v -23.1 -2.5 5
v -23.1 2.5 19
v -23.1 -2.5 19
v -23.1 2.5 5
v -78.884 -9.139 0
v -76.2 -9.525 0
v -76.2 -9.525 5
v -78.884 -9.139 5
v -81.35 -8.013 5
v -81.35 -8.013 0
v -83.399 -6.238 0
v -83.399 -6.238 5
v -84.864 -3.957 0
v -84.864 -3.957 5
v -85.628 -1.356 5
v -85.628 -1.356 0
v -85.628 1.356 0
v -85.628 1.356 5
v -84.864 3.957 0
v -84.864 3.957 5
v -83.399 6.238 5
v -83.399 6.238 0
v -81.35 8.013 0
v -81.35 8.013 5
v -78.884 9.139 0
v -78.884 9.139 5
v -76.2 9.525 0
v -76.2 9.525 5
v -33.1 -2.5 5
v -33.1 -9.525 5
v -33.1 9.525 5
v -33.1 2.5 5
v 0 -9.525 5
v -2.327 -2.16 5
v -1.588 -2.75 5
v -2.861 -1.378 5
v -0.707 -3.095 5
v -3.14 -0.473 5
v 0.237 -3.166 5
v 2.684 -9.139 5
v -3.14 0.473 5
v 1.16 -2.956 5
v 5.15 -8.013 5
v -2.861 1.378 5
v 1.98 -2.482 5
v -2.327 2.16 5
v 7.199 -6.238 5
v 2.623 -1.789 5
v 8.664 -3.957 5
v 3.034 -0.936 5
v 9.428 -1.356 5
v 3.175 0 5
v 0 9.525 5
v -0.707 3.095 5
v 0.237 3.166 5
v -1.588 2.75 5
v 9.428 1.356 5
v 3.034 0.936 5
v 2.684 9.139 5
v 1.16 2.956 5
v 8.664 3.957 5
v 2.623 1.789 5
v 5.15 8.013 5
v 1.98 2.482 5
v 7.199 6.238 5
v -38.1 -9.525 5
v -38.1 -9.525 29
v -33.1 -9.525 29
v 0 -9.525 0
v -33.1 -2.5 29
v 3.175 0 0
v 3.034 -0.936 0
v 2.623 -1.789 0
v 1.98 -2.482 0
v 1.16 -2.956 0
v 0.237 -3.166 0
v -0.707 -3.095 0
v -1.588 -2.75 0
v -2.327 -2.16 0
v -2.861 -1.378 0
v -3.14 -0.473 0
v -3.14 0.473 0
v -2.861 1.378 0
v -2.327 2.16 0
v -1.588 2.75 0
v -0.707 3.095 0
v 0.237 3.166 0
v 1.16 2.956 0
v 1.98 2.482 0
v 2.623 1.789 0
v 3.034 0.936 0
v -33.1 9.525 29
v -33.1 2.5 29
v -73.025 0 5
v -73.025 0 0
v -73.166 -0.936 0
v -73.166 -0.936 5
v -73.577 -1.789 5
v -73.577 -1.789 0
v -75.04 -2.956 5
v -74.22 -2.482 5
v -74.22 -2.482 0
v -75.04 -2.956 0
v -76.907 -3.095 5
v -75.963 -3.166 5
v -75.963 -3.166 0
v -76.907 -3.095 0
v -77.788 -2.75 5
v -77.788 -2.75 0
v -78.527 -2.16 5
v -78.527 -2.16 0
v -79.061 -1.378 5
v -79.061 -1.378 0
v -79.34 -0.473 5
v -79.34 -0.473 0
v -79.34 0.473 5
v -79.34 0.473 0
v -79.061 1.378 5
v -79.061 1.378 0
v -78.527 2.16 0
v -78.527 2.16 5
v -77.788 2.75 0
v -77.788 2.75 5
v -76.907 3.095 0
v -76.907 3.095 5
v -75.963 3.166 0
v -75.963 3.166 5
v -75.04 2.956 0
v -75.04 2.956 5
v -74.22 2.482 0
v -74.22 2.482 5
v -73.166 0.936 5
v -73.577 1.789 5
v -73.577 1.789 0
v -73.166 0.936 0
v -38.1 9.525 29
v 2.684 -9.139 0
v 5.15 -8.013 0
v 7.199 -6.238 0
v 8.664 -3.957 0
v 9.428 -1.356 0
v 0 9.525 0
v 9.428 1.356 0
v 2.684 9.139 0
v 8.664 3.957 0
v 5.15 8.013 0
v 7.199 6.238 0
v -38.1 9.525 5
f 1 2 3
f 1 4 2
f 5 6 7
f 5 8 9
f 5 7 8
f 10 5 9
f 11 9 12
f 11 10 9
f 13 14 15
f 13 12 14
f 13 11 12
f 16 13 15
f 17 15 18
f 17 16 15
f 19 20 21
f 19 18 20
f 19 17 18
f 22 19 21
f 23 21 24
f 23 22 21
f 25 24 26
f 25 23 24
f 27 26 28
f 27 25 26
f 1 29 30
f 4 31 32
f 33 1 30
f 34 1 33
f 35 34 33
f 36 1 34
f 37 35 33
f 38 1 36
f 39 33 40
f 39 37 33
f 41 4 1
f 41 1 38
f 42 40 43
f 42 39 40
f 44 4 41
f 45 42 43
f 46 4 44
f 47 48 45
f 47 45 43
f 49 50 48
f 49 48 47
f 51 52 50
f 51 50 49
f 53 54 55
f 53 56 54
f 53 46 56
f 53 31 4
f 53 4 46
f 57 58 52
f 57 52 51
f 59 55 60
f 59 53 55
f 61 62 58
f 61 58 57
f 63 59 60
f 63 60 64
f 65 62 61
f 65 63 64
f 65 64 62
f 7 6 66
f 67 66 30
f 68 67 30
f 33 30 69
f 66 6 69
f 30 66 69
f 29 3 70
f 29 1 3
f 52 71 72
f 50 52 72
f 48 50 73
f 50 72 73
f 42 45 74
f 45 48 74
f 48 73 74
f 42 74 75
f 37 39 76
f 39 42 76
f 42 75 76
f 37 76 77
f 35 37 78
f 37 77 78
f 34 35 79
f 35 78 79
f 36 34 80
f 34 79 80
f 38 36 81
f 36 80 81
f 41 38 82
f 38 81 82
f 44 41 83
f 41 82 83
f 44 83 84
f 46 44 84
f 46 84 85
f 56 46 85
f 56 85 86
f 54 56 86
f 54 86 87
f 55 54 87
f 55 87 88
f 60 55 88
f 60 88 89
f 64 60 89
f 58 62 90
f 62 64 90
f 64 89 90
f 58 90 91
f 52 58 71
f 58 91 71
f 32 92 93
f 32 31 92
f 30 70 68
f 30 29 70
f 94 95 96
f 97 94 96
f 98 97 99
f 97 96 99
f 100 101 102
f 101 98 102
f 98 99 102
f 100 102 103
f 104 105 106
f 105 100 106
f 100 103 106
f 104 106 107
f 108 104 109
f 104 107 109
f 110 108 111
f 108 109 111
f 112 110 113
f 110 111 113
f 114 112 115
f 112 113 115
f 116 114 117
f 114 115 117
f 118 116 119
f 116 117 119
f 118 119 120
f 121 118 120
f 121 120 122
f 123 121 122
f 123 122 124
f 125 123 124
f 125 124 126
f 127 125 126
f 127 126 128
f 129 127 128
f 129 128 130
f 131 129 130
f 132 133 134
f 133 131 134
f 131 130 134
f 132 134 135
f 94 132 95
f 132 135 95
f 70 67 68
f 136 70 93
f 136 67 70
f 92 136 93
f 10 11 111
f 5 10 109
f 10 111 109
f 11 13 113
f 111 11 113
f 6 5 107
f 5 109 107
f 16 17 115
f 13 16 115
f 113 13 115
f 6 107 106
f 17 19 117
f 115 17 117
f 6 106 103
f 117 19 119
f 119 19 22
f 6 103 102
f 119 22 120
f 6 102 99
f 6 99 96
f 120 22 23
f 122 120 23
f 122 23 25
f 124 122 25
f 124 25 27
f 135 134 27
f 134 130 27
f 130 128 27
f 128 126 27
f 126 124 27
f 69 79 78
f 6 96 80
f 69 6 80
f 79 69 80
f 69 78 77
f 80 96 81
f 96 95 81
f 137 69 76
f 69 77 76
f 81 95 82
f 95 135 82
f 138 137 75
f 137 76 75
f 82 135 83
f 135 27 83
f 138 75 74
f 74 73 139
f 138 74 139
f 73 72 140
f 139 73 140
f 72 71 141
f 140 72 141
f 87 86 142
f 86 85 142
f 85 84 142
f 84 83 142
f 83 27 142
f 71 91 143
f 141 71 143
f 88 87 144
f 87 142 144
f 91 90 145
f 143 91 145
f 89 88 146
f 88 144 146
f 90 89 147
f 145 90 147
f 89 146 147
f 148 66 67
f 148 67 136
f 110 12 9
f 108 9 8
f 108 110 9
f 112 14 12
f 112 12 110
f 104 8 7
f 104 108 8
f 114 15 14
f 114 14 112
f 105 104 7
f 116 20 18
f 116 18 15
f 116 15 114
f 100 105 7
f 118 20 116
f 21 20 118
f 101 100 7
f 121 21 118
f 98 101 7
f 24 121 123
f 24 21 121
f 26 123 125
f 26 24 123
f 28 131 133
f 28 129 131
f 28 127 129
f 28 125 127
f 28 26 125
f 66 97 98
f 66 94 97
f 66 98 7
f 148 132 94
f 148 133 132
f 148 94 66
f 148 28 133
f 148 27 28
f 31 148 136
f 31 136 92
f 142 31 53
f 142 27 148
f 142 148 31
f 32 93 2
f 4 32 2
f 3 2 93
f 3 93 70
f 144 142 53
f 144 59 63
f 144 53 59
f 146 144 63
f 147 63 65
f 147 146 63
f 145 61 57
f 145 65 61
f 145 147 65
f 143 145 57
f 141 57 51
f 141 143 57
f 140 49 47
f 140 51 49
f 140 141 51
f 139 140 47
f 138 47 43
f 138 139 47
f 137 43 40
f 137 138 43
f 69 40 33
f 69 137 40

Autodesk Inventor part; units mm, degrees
ref_plane "YZ Plane" through (0, 0, 0) normal (1, 0, 0) x (0, 1, 0)
ref_plane "XZ Plane" through (0, 0, 0) normal (0, 1, 0) x (-1, 0, 0)
ref_plane "XY Plane" through (0, 0, 0) normal (0, 0, 1) x (1, 0, 0)
sketch "Sketch1" plane through (0, 0, 0) normal (0, 0, 1) x (1, 0, 0)
  circle A0 centre (0, 0) radius 3.175
  circle A1 centre (-76.2, 0) radius 3.175
  arc A2 (-76.2, 9.525) -> (-76.2, -9.525) centre (-76.2, 0) ccw
  arc A3 (0, -9.525) -> (0, 9.525) centre (0, 0) ccw
  line L0 (-76.2, 9.525) -> (0, 9.525)
  line L1 (-76.2, -9.525) -> (0, -9.525)
  dimension "d0" = 6.35
  dimension "d1" = 6.35
  dimension "d2" = 76.2
  dimension "d3" = 6.35
  dimension "d4" = 6.35
extrude "Extrusion1" add sketch "Sketch1" along normal blind 5
sketch "Sketch2" plane through (0, 0, 5) normal (0, 0, 1) x (1, 0, 0)
  line L0 (0, 9.525) -> (-76.2, 9.525) projected
  line L1 (-76.2, -9.525) -> (0, -9.525) projected
  line L2 (-38.1, 9.525) -> (-33.1, 9.525)
  line L3 (-33.1, 9.525) -> (-33.1, -9.525)
  line L4 (-33.1, -9.525) -> (-38.1, -9.525)
  line L5 (-38.1, -9.525) -> (-38.1, 9.525)
  line L6 (-33.1, 2.5) -> (-23.1, 2.5)
  line L7 (-23.1, 2.5) -> (-23.1, -2.5)
  line L8 (-23.1, -2.5) -> (-33.1, -2.5)
  line L9 (-33.1, -2.5) -> (-33.1, 2.5)
  line L10 (-23.1, 0) -> (-38.1, 0) construction
  point P0 (0, 0)
  dimension "d7" = 5
  dimension "d8" = 10
  dimension "d9" = 5
extrude "Extrusion2" add sketch "Sketch2" along normal blind 24
chamfer "Chamfer1" distance 10 angle 45 1 edges at (-23.1, 0, 29)
properties part number "Y Axis Limit Switch Trigger"
